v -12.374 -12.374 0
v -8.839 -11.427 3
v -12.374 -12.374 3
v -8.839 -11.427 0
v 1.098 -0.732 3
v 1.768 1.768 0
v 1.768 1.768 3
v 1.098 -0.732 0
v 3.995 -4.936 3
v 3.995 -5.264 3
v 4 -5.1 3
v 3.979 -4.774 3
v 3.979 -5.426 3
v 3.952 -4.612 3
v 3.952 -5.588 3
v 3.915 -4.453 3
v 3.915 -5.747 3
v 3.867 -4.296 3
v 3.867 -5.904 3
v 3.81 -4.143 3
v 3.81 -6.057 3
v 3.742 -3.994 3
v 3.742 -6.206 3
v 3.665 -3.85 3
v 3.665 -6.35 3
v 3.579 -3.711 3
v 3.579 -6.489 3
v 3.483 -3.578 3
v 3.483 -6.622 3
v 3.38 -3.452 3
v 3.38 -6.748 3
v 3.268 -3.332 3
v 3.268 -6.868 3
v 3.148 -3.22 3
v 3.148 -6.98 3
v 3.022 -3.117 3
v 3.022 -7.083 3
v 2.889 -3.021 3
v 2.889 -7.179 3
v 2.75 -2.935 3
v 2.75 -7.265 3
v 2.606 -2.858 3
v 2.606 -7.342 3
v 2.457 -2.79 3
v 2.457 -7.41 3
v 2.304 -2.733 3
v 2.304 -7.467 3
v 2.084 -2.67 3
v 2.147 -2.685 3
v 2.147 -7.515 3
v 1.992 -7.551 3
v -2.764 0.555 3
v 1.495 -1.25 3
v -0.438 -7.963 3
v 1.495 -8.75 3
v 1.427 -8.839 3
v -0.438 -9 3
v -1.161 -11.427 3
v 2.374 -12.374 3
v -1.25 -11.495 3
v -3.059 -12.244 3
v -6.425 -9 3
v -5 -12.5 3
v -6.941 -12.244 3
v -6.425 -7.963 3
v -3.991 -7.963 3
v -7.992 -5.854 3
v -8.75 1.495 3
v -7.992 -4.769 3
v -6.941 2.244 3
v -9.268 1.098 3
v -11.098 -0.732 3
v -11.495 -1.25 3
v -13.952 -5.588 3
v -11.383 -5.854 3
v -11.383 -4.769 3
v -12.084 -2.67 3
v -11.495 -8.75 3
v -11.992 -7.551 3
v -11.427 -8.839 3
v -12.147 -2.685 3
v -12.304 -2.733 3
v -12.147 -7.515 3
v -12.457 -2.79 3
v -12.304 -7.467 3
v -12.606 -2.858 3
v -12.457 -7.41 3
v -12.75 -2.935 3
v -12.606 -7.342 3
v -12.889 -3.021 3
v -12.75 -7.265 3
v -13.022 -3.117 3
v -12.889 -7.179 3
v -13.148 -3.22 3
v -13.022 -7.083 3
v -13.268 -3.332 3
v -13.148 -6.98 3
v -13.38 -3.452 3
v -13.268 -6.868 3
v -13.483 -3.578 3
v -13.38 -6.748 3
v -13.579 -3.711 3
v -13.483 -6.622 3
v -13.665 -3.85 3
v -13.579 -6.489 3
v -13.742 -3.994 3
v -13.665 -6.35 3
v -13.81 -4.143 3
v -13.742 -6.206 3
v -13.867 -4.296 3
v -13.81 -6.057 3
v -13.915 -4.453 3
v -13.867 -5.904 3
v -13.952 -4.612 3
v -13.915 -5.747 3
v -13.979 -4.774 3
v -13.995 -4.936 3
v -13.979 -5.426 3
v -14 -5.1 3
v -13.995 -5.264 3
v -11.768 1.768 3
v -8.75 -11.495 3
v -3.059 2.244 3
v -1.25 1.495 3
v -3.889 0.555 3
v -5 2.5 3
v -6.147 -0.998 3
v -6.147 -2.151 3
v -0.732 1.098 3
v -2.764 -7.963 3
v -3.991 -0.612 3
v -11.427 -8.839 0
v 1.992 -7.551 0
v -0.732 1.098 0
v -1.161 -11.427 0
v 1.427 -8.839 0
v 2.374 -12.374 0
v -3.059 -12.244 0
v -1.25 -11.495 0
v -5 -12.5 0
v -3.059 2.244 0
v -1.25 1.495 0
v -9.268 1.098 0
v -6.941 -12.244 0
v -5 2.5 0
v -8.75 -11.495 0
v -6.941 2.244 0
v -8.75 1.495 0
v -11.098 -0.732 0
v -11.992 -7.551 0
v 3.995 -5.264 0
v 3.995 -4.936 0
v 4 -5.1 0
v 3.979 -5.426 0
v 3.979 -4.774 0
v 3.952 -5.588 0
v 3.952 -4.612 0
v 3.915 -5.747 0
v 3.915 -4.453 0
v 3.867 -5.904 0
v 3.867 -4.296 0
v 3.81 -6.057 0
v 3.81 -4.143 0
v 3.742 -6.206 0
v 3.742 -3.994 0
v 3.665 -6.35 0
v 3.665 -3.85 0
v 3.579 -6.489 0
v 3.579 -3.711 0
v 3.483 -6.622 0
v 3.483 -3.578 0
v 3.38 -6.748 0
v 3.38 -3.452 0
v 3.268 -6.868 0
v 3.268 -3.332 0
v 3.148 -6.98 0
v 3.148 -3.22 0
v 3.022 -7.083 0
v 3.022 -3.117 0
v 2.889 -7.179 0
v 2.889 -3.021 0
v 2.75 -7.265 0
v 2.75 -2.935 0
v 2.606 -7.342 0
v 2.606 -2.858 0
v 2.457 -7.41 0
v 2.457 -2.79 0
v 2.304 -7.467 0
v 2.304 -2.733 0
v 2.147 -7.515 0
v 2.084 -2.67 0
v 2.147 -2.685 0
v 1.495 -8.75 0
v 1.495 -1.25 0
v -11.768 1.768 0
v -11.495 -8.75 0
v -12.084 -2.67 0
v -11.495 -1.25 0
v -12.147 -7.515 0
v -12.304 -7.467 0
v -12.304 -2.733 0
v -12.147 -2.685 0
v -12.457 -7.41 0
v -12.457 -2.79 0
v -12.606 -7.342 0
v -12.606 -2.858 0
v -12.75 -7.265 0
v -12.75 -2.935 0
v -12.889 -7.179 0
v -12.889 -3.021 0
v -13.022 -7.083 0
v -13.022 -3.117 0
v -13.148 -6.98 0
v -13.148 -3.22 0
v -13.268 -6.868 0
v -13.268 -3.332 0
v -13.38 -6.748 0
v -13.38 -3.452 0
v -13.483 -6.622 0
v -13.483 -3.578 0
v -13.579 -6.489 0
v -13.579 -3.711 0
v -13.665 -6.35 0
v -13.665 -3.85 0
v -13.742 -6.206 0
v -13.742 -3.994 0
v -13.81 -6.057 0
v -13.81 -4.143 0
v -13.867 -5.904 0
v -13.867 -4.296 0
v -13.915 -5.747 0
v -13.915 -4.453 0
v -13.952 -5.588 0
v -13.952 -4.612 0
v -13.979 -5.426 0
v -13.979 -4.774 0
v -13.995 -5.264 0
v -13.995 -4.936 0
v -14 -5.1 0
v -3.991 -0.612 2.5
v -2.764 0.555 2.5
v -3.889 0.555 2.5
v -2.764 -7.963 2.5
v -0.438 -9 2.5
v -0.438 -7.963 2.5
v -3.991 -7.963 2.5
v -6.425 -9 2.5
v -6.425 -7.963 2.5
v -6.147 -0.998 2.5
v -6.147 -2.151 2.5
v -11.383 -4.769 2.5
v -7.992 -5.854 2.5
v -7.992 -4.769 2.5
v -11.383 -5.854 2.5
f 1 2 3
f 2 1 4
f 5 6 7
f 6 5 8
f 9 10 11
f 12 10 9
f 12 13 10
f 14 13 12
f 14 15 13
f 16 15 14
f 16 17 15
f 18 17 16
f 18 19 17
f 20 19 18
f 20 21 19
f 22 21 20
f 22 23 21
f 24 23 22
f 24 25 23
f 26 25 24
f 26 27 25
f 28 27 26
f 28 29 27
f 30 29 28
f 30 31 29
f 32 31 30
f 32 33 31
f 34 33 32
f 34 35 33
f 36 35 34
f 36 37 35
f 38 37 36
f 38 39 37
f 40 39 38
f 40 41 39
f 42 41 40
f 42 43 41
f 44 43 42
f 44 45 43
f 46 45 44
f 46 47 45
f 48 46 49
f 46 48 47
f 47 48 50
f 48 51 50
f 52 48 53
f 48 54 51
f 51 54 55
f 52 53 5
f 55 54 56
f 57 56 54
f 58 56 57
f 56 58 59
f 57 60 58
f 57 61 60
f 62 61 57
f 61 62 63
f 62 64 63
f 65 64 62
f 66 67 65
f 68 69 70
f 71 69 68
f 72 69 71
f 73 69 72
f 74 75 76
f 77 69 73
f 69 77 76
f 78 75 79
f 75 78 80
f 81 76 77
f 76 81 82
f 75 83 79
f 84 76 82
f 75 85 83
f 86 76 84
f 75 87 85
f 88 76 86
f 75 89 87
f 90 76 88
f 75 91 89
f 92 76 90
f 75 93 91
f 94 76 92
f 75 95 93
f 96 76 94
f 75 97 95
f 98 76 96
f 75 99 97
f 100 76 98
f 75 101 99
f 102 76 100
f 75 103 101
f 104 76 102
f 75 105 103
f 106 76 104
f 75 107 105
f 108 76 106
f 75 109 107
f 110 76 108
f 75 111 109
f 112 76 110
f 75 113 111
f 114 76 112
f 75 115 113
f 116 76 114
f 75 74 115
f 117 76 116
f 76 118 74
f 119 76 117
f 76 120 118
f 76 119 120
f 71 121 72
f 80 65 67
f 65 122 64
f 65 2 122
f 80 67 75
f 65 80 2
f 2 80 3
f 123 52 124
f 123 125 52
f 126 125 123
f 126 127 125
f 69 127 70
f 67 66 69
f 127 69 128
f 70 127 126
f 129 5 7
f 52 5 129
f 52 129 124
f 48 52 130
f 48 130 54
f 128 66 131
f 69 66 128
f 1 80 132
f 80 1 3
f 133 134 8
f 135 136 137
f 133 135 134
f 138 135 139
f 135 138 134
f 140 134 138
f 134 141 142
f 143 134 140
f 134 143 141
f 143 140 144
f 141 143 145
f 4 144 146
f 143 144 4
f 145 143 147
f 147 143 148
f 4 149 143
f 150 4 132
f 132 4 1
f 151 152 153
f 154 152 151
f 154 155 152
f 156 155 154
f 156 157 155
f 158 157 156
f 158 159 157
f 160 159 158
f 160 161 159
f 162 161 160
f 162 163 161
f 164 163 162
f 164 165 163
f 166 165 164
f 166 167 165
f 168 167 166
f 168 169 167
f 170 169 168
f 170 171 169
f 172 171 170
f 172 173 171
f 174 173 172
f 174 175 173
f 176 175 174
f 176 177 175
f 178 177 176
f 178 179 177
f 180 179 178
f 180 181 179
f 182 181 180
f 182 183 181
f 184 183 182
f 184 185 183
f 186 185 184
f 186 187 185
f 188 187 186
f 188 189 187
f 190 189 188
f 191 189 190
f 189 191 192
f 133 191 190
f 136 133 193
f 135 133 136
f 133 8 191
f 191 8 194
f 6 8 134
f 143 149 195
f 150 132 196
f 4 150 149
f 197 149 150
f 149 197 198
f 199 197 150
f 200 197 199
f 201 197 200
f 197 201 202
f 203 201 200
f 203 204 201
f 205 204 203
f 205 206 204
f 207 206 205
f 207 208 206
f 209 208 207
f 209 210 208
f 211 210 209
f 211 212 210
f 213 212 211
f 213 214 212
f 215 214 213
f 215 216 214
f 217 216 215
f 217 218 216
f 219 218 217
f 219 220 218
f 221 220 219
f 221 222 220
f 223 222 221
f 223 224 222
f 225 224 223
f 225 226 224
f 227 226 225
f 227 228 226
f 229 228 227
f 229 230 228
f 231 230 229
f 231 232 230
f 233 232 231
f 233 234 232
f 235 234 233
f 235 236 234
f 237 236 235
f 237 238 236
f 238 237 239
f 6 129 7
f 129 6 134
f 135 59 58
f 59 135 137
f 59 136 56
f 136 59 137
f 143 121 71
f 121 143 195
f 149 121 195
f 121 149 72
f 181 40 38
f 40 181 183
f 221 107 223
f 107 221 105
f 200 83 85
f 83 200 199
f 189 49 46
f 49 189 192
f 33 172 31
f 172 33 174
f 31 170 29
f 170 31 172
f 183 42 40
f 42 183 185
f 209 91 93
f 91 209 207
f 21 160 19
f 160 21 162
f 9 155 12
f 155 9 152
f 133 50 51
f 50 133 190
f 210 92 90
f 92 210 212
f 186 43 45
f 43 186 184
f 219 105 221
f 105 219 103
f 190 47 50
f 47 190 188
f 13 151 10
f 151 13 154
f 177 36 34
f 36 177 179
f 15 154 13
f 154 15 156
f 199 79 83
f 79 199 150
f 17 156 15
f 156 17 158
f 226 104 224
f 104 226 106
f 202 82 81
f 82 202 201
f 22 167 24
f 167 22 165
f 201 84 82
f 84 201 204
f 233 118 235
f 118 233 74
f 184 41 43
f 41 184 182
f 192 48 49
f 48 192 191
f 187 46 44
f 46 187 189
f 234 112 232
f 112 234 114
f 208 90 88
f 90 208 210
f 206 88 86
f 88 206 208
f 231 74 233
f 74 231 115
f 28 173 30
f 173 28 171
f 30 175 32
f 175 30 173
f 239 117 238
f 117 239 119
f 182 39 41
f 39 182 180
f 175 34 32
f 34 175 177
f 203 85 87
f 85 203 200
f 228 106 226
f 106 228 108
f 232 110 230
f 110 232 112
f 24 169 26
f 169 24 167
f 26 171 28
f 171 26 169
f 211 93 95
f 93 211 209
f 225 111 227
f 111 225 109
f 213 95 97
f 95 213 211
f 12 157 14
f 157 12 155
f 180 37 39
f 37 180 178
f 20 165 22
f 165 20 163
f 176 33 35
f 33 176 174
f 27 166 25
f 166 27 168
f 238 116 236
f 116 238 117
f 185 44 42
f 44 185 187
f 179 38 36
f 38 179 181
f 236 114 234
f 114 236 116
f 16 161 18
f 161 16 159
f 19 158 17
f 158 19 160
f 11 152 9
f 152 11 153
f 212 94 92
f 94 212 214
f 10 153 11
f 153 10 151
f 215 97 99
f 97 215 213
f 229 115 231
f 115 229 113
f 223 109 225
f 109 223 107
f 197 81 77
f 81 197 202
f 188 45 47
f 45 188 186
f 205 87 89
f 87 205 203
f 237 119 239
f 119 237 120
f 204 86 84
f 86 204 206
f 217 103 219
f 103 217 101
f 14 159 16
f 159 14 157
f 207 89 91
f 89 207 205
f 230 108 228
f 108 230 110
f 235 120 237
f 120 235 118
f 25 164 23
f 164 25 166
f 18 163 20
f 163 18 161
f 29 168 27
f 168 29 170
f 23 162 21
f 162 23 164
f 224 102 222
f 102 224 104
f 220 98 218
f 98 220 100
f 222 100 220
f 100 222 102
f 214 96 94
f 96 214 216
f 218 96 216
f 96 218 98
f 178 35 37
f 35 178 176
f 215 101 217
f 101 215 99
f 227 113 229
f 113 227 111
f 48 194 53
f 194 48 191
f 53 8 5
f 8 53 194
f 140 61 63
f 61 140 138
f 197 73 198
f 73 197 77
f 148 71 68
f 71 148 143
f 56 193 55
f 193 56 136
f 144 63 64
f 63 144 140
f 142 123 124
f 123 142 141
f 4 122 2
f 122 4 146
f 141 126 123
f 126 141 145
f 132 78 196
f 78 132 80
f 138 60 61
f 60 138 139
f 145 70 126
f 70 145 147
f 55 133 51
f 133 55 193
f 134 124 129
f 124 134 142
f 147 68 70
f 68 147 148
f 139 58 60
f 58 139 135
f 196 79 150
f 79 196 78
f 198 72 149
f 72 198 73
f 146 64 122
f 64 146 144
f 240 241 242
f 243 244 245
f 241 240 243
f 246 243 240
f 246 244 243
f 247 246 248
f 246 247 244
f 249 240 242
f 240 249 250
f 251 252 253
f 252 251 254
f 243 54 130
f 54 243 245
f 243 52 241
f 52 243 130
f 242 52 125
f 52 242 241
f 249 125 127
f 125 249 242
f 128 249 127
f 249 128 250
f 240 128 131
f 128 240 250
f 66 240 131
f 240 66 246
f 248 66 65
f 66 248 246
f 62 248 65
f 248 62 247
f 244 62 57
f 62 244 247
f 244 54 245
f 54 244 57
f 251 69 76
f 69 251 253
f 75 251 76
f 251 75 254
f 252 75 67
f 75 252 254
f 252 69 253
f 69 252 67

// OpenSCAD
difference() {
    union() {
        rotate([0,0,45])
        pointyEdges();
        translate([-10,0,0])
        rotate([0,0,135])
        pointyEdges();

        translate([1.5,-5.1,0])
        roundEdges(d=5,h=3);
        
        translate([-5,-5,0])
        cylinder(d=15,h=3);
    }
    translate([-12,-9,2.5])
    linear_extrude(1)
    text("-1");
}

module roundEdges(d,h) {
    hull() {
        cylinder(d=d, h=h, $fn=96);
        translate([-13,0,0])
        cylinder(d=d, h=h, $fn=96);
    }
}

module pointyEdges() {
    hull() {
        eqi_triangle();
        translate([-15,0,0])
        rotate([0,0,180])
        eqi_triangle();
    }
}

module eqi_triangle(d=5,h=3) {
  cylinder(d=d,h=h,$fn=3);
}
